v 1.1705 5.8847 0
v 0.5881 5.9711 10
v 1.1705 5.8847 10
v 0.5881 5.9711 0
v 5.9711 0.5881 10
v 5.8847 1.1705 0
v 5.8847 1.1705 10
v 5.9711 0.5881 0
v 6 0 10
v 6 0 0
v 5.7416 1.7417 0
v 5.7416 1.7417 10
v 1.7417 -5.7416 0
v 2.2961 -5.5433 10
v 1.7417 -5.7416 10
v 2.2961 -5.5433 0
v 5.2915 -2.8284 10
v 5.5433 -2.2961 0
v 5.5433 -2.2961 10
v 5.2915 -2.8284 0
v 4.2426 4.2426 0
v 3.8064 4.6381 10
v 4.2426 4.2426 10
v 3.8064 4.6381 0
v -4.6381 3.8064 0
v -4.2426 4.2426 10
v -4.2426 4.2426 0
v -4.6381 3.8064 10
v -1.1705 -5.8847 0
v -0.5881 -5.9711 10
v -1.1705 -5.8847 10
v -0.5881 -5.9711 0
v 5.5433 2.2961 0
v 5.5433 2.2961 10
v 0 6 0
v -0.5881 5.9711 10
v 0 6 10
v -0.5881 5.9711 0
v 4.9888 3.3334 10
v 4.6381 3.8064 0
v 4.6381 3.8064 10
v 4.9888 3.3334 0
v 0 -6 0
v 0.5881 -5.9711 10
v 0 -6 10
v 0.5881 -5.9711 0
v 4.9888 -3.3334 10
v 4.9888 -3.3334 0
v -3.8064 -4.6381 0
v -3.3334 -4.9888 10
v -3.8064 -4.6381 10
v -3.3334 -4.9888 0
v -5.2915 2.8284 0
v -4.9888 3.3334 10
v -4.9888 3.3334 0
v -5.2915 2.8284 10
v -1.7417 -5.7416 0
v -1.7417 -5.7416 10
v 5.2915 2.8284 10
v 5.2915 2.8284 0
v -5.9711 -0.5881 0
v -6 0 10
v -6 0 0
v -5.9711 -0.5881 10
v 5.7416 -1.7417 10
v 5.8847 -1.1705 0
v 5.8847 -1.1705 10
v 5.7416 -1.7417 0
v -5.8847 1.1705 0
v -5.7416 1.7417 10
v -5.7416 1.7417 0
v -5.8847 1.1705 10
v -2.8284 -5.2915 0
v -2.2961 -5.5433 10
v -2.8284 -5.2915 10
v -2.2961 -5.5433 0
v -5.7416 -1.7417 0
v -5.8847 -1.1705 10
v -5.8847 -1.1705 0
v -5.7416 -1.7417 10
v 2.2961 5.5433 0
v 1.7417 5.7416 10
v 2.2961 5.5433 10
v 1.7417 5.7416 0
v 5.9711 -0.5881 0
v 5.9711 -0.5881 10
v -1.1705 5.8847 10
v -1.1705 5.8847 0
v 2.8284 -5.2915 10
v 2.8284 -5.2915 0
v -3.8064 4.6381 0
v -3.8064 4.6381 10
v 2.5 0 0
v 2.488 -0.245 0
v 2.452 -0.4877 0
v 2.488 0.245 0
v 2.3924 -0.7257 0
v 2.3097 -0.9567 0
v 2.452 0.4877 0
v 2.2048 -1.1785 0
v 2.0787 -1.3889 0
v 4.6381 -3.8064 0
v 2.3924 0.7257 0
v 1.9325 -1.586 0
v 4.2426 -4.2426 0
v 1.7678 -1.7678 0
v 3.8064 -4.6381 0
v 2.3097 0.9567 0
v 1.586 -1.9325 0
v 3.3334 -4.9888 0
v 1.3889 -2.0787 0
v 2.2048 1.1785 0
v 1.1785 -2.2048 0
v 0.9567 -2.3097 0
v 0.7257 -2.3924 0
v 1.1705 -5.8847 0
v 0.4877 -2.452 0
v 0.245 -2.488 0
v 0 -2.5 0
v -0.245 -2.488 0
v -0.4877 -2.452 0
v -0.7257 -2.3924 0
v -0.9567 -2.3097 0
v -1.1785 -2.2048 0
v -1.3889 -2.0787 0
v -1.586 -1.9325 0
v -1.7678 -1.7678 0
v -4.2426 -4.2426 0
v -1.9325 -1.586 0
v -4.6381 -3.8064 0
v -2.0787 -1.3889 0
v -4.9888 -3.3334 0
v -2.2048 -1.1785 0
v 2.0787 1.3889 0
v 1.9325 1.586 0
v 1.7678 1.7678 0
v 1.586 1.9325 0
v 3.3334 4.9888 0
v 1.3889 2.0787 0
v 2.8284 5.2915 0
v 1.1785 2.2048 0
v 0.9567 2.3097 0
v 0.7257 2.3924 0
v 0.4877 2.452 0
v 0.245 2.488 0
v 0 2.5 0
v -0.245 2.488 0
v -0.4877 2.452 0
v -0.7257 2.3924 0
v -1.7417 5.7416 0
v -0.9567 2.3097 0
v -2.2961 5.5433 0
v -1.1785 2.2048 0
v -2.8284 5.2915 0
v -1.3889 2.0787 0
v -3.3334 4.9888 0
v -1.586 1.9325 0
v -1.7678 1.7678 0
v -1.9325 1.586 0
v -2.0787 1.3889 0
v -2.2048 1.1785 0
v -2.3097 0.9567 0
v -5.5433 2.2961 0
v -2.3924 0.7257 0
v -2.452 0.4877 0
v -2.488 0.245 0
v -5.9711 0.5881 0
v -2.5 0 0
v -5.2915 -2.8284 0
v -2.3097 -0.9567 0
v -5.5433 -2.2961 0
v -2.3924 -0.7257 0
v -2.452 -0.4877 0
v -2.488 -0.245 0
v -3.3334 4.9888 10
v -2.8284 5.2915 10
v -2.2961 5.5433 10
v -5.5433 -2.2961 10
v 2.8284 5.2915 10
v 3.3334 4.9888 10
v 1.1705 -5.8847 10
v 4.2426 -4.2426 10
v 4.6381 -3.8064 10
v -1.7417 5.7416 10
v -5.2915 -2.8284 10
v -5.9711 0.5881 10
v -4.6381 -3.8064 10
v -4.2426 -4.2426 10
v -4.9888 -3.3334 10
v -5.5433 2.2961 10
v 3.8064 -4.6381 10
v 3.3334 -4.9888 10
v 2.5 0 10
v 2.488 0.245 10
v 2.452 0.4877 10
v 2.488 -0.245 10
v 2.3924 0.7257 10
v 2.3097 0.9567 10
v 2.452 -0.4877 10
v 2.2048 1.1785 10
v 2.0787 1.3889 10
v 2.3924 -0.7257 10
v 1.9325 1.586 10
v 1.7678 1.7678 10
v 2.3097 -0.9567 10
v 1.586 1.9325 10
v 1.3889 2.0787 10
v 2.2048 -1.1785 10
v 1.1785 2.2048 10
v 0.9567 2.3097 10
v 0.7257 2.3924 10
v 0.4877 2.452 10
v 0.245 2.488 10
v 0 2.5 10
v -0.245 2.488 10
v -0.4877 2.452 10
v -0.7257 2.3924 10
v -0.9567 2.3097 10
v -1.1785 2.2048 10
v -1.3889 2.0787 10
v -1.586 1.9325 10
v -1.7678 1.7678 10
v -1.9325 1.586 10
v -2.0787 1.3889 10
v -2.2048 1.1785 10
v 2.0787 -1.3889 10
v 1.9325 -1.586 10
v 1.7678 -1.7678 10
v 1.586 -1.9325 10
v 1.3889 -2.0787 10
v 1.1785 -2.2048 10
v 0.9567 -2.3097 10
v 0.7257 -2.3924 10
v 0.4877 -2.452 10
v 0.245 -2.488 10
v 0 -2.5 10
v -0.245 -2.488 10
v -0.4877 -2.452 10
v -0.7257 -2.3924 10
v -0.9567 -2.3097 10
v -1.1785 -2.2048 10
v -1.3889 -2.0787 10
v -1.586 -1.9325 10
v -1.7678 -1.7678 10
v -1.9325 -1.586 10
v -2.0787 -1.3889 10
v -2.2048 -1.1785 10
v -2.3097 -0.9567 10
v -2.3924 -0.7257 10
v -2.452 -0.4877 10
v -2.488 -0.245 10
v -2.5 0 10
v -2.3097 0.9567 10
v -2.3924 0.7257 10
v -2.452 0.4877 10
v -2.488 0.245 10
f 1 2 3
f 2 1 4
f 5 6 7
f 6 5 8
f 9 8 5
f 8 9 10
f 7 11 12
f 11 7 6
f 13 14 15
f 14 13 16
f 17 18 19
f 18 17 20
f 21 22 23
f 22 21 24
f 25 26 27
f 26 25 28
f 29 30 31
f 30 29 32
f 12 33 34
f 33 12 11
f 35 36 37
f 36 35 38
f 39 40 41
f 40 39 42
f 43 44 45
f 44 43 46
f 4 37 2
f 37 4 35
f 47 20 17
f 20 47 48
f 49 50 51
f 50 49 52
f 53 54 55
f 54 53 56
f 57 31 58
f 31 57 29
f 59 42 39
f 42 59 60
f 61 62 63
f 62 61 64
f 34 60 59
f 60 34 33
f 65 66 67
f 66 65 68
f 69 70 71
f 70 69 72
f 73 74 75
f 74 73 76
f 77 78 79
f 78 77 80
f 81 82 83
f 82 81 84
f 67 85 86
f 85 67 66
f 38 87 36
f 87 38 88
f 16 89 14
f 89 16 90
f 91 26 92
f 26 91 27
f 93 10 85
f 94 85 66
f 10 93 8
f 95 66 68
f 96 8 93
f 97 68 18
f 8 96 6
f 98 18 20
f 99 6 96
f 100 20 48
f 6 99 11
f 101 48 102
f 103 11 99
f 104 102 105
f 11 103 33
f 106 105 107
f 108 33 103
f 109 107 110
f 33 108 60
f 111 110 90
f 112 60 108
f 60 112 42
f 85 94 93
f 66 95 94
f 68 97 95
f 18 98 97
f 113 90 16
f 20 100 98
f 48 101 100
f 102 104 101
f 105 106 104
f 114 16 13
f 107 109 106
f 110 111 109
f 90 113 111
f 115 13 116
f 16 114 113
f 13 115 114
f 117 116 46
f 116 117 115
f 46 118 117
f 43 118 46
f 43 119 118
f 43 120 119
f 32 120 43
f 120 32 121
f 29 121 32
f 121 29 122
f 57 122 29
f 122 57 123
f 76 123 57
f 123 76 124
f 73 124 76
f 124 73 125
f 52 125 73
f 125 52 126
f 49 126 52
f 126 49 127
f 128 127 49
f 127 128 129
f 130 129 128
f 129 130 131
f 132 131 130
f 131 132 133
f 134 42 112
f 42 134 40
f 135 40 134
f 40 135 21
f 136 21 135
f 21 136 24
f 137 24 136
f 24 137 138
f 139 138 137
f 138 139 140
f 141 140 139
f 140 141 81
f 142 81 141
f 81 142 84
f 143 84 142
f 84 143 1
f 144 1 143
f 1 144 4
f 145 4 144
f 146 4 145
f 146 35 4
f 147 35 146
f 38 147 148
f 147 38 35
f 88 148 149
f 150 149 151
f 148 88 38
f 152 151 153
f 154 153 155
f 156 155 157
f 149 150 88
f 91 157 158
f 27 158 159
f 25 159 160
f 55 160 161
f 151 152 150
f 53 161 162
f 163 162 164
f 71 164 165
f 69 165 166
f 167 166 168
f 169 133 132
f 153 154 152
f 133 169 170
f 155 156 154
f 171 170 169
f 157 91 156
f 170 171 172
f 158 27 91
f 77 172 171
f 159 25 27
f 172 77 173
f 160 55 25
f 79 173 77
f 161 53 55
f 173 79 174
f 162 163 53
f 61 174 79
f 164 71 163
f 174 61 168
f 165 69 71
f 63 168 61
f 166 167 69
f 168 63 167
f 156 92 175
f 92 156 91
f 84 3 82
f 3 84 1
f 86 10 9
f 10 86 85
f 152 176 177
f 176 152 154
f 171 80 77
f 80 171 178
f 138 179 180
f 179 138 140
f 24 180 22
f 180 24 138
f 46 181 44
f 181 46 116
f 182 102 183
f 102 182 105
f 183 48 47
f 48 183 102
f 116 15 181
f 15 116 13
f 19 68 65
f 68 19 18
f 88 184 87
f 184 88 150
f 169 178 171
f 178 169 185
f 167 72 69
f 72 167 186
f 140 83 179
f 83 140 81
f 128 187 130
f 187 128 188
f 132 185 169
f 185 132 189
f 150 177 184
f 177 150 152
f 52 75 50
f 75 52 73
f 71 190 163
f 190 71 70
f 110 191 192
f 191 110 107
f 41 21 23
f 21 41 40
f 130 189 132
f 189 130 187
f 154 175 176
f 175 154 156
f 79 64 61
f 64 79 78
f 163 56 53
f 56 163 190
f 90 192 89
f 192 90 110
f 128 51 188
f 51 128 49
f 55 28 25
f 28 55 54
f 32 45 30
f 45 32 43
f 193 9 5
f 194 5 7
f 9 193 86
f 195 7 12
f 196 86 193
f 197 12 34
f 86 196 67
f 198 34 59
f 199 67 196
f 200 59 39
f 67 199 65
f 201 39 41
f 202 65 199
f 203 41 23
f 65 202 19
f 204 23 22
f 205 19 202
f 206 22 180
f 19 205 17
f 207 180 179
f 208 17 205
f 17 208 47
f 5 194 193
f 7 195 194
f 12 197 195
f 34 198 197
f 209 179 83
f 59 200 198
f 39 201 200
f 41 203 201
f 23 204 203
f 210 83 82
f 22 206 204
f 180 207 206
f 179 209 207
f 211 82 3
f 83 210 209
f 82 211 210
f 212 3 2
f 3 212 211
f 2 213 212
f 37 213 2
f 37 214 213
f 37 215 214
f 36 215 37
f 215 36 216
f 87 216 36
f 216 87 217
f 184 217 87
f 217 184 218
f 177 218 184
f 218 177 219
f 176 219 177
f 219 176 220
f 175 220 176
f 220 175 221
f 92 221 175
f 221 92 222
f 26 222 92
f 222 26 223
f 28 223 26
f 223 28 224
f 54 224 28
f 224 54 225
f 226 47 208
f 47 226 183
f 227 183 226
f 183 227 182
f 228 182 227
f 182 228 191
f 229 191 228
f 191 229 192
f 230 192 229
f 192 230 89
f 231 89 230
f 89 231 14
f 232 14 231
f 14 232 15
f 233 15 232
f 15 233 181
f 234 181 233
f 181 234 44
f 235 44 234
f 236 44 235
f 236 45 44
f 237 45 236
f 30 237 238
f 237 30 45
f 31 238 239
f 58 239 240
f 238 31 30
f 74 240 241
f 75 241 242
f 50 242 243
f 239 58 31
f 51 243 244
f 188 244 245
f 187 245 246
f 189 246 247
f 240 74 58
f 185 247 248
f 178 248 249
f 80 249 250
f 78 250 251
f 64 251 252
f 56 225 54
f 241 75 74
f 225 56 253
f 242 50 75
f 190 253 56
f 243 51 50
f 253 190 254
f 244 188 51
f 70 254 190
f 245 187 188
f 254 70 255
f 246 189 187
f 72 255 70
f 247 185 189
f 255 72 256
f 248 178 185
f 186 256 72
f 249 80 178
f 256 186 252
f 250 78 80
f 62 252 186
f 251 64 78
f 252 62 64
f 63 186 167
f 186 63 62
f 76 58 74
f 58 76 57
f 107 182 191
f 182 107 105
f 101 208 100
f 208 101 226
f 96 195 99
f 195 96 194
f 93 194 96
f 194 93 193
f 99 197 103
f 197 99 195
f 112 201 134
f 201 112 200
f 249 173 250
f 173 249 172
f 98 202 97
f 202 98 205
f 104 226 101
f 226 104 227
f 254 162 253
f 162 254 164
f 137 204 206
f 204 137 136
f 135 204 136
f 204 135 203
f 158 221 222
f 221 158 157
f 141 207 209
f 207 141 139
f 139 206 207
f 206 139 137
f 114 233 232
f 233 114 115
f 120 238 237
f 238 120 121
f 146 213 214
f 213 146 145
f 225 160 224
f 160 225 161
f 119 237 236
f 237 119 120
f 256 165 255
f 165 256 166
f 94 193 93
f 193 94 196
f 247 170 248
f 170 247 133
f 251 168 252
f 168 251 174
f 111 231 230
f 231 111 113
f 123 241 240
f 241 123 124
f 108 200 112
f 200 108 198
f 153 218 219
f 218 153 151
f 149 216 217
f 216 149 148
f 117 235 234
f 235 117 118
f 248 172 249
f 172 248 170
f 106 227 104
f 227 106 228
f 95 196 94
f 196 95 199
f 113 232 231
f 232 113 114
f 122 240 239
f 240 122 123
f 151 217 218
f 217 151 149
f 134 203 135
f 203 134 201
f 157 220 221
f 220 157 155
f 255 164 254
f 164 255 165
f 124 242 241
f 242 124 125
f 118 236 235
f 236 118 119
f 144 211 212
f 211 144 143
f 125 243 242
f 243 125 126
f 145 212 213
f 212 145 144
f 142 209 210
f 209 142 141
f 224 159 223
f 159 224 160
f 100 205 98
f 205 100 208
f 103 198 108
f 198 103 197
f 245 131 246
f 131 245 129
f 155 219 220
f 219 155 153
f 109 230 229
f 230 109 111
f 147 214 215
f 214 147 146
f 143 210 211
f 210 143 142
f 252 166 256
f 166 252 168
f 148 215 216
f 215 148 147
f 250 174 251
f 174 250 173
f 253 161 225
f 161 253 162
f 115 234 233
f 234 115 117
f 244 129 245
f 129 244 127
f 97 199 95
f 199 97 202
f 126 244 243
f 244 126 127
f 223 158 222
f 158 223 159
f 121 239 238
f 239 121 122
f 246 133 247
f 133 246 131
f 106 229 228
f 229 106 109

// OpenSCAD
module threaded_insert() {
    difference() {
        cylinder(h=10, d=12, $fn=64);
        translate([0, 0, -1])
            cylinder(h=12, d=5, $fn=64);
    }
}

threaded_insert();
